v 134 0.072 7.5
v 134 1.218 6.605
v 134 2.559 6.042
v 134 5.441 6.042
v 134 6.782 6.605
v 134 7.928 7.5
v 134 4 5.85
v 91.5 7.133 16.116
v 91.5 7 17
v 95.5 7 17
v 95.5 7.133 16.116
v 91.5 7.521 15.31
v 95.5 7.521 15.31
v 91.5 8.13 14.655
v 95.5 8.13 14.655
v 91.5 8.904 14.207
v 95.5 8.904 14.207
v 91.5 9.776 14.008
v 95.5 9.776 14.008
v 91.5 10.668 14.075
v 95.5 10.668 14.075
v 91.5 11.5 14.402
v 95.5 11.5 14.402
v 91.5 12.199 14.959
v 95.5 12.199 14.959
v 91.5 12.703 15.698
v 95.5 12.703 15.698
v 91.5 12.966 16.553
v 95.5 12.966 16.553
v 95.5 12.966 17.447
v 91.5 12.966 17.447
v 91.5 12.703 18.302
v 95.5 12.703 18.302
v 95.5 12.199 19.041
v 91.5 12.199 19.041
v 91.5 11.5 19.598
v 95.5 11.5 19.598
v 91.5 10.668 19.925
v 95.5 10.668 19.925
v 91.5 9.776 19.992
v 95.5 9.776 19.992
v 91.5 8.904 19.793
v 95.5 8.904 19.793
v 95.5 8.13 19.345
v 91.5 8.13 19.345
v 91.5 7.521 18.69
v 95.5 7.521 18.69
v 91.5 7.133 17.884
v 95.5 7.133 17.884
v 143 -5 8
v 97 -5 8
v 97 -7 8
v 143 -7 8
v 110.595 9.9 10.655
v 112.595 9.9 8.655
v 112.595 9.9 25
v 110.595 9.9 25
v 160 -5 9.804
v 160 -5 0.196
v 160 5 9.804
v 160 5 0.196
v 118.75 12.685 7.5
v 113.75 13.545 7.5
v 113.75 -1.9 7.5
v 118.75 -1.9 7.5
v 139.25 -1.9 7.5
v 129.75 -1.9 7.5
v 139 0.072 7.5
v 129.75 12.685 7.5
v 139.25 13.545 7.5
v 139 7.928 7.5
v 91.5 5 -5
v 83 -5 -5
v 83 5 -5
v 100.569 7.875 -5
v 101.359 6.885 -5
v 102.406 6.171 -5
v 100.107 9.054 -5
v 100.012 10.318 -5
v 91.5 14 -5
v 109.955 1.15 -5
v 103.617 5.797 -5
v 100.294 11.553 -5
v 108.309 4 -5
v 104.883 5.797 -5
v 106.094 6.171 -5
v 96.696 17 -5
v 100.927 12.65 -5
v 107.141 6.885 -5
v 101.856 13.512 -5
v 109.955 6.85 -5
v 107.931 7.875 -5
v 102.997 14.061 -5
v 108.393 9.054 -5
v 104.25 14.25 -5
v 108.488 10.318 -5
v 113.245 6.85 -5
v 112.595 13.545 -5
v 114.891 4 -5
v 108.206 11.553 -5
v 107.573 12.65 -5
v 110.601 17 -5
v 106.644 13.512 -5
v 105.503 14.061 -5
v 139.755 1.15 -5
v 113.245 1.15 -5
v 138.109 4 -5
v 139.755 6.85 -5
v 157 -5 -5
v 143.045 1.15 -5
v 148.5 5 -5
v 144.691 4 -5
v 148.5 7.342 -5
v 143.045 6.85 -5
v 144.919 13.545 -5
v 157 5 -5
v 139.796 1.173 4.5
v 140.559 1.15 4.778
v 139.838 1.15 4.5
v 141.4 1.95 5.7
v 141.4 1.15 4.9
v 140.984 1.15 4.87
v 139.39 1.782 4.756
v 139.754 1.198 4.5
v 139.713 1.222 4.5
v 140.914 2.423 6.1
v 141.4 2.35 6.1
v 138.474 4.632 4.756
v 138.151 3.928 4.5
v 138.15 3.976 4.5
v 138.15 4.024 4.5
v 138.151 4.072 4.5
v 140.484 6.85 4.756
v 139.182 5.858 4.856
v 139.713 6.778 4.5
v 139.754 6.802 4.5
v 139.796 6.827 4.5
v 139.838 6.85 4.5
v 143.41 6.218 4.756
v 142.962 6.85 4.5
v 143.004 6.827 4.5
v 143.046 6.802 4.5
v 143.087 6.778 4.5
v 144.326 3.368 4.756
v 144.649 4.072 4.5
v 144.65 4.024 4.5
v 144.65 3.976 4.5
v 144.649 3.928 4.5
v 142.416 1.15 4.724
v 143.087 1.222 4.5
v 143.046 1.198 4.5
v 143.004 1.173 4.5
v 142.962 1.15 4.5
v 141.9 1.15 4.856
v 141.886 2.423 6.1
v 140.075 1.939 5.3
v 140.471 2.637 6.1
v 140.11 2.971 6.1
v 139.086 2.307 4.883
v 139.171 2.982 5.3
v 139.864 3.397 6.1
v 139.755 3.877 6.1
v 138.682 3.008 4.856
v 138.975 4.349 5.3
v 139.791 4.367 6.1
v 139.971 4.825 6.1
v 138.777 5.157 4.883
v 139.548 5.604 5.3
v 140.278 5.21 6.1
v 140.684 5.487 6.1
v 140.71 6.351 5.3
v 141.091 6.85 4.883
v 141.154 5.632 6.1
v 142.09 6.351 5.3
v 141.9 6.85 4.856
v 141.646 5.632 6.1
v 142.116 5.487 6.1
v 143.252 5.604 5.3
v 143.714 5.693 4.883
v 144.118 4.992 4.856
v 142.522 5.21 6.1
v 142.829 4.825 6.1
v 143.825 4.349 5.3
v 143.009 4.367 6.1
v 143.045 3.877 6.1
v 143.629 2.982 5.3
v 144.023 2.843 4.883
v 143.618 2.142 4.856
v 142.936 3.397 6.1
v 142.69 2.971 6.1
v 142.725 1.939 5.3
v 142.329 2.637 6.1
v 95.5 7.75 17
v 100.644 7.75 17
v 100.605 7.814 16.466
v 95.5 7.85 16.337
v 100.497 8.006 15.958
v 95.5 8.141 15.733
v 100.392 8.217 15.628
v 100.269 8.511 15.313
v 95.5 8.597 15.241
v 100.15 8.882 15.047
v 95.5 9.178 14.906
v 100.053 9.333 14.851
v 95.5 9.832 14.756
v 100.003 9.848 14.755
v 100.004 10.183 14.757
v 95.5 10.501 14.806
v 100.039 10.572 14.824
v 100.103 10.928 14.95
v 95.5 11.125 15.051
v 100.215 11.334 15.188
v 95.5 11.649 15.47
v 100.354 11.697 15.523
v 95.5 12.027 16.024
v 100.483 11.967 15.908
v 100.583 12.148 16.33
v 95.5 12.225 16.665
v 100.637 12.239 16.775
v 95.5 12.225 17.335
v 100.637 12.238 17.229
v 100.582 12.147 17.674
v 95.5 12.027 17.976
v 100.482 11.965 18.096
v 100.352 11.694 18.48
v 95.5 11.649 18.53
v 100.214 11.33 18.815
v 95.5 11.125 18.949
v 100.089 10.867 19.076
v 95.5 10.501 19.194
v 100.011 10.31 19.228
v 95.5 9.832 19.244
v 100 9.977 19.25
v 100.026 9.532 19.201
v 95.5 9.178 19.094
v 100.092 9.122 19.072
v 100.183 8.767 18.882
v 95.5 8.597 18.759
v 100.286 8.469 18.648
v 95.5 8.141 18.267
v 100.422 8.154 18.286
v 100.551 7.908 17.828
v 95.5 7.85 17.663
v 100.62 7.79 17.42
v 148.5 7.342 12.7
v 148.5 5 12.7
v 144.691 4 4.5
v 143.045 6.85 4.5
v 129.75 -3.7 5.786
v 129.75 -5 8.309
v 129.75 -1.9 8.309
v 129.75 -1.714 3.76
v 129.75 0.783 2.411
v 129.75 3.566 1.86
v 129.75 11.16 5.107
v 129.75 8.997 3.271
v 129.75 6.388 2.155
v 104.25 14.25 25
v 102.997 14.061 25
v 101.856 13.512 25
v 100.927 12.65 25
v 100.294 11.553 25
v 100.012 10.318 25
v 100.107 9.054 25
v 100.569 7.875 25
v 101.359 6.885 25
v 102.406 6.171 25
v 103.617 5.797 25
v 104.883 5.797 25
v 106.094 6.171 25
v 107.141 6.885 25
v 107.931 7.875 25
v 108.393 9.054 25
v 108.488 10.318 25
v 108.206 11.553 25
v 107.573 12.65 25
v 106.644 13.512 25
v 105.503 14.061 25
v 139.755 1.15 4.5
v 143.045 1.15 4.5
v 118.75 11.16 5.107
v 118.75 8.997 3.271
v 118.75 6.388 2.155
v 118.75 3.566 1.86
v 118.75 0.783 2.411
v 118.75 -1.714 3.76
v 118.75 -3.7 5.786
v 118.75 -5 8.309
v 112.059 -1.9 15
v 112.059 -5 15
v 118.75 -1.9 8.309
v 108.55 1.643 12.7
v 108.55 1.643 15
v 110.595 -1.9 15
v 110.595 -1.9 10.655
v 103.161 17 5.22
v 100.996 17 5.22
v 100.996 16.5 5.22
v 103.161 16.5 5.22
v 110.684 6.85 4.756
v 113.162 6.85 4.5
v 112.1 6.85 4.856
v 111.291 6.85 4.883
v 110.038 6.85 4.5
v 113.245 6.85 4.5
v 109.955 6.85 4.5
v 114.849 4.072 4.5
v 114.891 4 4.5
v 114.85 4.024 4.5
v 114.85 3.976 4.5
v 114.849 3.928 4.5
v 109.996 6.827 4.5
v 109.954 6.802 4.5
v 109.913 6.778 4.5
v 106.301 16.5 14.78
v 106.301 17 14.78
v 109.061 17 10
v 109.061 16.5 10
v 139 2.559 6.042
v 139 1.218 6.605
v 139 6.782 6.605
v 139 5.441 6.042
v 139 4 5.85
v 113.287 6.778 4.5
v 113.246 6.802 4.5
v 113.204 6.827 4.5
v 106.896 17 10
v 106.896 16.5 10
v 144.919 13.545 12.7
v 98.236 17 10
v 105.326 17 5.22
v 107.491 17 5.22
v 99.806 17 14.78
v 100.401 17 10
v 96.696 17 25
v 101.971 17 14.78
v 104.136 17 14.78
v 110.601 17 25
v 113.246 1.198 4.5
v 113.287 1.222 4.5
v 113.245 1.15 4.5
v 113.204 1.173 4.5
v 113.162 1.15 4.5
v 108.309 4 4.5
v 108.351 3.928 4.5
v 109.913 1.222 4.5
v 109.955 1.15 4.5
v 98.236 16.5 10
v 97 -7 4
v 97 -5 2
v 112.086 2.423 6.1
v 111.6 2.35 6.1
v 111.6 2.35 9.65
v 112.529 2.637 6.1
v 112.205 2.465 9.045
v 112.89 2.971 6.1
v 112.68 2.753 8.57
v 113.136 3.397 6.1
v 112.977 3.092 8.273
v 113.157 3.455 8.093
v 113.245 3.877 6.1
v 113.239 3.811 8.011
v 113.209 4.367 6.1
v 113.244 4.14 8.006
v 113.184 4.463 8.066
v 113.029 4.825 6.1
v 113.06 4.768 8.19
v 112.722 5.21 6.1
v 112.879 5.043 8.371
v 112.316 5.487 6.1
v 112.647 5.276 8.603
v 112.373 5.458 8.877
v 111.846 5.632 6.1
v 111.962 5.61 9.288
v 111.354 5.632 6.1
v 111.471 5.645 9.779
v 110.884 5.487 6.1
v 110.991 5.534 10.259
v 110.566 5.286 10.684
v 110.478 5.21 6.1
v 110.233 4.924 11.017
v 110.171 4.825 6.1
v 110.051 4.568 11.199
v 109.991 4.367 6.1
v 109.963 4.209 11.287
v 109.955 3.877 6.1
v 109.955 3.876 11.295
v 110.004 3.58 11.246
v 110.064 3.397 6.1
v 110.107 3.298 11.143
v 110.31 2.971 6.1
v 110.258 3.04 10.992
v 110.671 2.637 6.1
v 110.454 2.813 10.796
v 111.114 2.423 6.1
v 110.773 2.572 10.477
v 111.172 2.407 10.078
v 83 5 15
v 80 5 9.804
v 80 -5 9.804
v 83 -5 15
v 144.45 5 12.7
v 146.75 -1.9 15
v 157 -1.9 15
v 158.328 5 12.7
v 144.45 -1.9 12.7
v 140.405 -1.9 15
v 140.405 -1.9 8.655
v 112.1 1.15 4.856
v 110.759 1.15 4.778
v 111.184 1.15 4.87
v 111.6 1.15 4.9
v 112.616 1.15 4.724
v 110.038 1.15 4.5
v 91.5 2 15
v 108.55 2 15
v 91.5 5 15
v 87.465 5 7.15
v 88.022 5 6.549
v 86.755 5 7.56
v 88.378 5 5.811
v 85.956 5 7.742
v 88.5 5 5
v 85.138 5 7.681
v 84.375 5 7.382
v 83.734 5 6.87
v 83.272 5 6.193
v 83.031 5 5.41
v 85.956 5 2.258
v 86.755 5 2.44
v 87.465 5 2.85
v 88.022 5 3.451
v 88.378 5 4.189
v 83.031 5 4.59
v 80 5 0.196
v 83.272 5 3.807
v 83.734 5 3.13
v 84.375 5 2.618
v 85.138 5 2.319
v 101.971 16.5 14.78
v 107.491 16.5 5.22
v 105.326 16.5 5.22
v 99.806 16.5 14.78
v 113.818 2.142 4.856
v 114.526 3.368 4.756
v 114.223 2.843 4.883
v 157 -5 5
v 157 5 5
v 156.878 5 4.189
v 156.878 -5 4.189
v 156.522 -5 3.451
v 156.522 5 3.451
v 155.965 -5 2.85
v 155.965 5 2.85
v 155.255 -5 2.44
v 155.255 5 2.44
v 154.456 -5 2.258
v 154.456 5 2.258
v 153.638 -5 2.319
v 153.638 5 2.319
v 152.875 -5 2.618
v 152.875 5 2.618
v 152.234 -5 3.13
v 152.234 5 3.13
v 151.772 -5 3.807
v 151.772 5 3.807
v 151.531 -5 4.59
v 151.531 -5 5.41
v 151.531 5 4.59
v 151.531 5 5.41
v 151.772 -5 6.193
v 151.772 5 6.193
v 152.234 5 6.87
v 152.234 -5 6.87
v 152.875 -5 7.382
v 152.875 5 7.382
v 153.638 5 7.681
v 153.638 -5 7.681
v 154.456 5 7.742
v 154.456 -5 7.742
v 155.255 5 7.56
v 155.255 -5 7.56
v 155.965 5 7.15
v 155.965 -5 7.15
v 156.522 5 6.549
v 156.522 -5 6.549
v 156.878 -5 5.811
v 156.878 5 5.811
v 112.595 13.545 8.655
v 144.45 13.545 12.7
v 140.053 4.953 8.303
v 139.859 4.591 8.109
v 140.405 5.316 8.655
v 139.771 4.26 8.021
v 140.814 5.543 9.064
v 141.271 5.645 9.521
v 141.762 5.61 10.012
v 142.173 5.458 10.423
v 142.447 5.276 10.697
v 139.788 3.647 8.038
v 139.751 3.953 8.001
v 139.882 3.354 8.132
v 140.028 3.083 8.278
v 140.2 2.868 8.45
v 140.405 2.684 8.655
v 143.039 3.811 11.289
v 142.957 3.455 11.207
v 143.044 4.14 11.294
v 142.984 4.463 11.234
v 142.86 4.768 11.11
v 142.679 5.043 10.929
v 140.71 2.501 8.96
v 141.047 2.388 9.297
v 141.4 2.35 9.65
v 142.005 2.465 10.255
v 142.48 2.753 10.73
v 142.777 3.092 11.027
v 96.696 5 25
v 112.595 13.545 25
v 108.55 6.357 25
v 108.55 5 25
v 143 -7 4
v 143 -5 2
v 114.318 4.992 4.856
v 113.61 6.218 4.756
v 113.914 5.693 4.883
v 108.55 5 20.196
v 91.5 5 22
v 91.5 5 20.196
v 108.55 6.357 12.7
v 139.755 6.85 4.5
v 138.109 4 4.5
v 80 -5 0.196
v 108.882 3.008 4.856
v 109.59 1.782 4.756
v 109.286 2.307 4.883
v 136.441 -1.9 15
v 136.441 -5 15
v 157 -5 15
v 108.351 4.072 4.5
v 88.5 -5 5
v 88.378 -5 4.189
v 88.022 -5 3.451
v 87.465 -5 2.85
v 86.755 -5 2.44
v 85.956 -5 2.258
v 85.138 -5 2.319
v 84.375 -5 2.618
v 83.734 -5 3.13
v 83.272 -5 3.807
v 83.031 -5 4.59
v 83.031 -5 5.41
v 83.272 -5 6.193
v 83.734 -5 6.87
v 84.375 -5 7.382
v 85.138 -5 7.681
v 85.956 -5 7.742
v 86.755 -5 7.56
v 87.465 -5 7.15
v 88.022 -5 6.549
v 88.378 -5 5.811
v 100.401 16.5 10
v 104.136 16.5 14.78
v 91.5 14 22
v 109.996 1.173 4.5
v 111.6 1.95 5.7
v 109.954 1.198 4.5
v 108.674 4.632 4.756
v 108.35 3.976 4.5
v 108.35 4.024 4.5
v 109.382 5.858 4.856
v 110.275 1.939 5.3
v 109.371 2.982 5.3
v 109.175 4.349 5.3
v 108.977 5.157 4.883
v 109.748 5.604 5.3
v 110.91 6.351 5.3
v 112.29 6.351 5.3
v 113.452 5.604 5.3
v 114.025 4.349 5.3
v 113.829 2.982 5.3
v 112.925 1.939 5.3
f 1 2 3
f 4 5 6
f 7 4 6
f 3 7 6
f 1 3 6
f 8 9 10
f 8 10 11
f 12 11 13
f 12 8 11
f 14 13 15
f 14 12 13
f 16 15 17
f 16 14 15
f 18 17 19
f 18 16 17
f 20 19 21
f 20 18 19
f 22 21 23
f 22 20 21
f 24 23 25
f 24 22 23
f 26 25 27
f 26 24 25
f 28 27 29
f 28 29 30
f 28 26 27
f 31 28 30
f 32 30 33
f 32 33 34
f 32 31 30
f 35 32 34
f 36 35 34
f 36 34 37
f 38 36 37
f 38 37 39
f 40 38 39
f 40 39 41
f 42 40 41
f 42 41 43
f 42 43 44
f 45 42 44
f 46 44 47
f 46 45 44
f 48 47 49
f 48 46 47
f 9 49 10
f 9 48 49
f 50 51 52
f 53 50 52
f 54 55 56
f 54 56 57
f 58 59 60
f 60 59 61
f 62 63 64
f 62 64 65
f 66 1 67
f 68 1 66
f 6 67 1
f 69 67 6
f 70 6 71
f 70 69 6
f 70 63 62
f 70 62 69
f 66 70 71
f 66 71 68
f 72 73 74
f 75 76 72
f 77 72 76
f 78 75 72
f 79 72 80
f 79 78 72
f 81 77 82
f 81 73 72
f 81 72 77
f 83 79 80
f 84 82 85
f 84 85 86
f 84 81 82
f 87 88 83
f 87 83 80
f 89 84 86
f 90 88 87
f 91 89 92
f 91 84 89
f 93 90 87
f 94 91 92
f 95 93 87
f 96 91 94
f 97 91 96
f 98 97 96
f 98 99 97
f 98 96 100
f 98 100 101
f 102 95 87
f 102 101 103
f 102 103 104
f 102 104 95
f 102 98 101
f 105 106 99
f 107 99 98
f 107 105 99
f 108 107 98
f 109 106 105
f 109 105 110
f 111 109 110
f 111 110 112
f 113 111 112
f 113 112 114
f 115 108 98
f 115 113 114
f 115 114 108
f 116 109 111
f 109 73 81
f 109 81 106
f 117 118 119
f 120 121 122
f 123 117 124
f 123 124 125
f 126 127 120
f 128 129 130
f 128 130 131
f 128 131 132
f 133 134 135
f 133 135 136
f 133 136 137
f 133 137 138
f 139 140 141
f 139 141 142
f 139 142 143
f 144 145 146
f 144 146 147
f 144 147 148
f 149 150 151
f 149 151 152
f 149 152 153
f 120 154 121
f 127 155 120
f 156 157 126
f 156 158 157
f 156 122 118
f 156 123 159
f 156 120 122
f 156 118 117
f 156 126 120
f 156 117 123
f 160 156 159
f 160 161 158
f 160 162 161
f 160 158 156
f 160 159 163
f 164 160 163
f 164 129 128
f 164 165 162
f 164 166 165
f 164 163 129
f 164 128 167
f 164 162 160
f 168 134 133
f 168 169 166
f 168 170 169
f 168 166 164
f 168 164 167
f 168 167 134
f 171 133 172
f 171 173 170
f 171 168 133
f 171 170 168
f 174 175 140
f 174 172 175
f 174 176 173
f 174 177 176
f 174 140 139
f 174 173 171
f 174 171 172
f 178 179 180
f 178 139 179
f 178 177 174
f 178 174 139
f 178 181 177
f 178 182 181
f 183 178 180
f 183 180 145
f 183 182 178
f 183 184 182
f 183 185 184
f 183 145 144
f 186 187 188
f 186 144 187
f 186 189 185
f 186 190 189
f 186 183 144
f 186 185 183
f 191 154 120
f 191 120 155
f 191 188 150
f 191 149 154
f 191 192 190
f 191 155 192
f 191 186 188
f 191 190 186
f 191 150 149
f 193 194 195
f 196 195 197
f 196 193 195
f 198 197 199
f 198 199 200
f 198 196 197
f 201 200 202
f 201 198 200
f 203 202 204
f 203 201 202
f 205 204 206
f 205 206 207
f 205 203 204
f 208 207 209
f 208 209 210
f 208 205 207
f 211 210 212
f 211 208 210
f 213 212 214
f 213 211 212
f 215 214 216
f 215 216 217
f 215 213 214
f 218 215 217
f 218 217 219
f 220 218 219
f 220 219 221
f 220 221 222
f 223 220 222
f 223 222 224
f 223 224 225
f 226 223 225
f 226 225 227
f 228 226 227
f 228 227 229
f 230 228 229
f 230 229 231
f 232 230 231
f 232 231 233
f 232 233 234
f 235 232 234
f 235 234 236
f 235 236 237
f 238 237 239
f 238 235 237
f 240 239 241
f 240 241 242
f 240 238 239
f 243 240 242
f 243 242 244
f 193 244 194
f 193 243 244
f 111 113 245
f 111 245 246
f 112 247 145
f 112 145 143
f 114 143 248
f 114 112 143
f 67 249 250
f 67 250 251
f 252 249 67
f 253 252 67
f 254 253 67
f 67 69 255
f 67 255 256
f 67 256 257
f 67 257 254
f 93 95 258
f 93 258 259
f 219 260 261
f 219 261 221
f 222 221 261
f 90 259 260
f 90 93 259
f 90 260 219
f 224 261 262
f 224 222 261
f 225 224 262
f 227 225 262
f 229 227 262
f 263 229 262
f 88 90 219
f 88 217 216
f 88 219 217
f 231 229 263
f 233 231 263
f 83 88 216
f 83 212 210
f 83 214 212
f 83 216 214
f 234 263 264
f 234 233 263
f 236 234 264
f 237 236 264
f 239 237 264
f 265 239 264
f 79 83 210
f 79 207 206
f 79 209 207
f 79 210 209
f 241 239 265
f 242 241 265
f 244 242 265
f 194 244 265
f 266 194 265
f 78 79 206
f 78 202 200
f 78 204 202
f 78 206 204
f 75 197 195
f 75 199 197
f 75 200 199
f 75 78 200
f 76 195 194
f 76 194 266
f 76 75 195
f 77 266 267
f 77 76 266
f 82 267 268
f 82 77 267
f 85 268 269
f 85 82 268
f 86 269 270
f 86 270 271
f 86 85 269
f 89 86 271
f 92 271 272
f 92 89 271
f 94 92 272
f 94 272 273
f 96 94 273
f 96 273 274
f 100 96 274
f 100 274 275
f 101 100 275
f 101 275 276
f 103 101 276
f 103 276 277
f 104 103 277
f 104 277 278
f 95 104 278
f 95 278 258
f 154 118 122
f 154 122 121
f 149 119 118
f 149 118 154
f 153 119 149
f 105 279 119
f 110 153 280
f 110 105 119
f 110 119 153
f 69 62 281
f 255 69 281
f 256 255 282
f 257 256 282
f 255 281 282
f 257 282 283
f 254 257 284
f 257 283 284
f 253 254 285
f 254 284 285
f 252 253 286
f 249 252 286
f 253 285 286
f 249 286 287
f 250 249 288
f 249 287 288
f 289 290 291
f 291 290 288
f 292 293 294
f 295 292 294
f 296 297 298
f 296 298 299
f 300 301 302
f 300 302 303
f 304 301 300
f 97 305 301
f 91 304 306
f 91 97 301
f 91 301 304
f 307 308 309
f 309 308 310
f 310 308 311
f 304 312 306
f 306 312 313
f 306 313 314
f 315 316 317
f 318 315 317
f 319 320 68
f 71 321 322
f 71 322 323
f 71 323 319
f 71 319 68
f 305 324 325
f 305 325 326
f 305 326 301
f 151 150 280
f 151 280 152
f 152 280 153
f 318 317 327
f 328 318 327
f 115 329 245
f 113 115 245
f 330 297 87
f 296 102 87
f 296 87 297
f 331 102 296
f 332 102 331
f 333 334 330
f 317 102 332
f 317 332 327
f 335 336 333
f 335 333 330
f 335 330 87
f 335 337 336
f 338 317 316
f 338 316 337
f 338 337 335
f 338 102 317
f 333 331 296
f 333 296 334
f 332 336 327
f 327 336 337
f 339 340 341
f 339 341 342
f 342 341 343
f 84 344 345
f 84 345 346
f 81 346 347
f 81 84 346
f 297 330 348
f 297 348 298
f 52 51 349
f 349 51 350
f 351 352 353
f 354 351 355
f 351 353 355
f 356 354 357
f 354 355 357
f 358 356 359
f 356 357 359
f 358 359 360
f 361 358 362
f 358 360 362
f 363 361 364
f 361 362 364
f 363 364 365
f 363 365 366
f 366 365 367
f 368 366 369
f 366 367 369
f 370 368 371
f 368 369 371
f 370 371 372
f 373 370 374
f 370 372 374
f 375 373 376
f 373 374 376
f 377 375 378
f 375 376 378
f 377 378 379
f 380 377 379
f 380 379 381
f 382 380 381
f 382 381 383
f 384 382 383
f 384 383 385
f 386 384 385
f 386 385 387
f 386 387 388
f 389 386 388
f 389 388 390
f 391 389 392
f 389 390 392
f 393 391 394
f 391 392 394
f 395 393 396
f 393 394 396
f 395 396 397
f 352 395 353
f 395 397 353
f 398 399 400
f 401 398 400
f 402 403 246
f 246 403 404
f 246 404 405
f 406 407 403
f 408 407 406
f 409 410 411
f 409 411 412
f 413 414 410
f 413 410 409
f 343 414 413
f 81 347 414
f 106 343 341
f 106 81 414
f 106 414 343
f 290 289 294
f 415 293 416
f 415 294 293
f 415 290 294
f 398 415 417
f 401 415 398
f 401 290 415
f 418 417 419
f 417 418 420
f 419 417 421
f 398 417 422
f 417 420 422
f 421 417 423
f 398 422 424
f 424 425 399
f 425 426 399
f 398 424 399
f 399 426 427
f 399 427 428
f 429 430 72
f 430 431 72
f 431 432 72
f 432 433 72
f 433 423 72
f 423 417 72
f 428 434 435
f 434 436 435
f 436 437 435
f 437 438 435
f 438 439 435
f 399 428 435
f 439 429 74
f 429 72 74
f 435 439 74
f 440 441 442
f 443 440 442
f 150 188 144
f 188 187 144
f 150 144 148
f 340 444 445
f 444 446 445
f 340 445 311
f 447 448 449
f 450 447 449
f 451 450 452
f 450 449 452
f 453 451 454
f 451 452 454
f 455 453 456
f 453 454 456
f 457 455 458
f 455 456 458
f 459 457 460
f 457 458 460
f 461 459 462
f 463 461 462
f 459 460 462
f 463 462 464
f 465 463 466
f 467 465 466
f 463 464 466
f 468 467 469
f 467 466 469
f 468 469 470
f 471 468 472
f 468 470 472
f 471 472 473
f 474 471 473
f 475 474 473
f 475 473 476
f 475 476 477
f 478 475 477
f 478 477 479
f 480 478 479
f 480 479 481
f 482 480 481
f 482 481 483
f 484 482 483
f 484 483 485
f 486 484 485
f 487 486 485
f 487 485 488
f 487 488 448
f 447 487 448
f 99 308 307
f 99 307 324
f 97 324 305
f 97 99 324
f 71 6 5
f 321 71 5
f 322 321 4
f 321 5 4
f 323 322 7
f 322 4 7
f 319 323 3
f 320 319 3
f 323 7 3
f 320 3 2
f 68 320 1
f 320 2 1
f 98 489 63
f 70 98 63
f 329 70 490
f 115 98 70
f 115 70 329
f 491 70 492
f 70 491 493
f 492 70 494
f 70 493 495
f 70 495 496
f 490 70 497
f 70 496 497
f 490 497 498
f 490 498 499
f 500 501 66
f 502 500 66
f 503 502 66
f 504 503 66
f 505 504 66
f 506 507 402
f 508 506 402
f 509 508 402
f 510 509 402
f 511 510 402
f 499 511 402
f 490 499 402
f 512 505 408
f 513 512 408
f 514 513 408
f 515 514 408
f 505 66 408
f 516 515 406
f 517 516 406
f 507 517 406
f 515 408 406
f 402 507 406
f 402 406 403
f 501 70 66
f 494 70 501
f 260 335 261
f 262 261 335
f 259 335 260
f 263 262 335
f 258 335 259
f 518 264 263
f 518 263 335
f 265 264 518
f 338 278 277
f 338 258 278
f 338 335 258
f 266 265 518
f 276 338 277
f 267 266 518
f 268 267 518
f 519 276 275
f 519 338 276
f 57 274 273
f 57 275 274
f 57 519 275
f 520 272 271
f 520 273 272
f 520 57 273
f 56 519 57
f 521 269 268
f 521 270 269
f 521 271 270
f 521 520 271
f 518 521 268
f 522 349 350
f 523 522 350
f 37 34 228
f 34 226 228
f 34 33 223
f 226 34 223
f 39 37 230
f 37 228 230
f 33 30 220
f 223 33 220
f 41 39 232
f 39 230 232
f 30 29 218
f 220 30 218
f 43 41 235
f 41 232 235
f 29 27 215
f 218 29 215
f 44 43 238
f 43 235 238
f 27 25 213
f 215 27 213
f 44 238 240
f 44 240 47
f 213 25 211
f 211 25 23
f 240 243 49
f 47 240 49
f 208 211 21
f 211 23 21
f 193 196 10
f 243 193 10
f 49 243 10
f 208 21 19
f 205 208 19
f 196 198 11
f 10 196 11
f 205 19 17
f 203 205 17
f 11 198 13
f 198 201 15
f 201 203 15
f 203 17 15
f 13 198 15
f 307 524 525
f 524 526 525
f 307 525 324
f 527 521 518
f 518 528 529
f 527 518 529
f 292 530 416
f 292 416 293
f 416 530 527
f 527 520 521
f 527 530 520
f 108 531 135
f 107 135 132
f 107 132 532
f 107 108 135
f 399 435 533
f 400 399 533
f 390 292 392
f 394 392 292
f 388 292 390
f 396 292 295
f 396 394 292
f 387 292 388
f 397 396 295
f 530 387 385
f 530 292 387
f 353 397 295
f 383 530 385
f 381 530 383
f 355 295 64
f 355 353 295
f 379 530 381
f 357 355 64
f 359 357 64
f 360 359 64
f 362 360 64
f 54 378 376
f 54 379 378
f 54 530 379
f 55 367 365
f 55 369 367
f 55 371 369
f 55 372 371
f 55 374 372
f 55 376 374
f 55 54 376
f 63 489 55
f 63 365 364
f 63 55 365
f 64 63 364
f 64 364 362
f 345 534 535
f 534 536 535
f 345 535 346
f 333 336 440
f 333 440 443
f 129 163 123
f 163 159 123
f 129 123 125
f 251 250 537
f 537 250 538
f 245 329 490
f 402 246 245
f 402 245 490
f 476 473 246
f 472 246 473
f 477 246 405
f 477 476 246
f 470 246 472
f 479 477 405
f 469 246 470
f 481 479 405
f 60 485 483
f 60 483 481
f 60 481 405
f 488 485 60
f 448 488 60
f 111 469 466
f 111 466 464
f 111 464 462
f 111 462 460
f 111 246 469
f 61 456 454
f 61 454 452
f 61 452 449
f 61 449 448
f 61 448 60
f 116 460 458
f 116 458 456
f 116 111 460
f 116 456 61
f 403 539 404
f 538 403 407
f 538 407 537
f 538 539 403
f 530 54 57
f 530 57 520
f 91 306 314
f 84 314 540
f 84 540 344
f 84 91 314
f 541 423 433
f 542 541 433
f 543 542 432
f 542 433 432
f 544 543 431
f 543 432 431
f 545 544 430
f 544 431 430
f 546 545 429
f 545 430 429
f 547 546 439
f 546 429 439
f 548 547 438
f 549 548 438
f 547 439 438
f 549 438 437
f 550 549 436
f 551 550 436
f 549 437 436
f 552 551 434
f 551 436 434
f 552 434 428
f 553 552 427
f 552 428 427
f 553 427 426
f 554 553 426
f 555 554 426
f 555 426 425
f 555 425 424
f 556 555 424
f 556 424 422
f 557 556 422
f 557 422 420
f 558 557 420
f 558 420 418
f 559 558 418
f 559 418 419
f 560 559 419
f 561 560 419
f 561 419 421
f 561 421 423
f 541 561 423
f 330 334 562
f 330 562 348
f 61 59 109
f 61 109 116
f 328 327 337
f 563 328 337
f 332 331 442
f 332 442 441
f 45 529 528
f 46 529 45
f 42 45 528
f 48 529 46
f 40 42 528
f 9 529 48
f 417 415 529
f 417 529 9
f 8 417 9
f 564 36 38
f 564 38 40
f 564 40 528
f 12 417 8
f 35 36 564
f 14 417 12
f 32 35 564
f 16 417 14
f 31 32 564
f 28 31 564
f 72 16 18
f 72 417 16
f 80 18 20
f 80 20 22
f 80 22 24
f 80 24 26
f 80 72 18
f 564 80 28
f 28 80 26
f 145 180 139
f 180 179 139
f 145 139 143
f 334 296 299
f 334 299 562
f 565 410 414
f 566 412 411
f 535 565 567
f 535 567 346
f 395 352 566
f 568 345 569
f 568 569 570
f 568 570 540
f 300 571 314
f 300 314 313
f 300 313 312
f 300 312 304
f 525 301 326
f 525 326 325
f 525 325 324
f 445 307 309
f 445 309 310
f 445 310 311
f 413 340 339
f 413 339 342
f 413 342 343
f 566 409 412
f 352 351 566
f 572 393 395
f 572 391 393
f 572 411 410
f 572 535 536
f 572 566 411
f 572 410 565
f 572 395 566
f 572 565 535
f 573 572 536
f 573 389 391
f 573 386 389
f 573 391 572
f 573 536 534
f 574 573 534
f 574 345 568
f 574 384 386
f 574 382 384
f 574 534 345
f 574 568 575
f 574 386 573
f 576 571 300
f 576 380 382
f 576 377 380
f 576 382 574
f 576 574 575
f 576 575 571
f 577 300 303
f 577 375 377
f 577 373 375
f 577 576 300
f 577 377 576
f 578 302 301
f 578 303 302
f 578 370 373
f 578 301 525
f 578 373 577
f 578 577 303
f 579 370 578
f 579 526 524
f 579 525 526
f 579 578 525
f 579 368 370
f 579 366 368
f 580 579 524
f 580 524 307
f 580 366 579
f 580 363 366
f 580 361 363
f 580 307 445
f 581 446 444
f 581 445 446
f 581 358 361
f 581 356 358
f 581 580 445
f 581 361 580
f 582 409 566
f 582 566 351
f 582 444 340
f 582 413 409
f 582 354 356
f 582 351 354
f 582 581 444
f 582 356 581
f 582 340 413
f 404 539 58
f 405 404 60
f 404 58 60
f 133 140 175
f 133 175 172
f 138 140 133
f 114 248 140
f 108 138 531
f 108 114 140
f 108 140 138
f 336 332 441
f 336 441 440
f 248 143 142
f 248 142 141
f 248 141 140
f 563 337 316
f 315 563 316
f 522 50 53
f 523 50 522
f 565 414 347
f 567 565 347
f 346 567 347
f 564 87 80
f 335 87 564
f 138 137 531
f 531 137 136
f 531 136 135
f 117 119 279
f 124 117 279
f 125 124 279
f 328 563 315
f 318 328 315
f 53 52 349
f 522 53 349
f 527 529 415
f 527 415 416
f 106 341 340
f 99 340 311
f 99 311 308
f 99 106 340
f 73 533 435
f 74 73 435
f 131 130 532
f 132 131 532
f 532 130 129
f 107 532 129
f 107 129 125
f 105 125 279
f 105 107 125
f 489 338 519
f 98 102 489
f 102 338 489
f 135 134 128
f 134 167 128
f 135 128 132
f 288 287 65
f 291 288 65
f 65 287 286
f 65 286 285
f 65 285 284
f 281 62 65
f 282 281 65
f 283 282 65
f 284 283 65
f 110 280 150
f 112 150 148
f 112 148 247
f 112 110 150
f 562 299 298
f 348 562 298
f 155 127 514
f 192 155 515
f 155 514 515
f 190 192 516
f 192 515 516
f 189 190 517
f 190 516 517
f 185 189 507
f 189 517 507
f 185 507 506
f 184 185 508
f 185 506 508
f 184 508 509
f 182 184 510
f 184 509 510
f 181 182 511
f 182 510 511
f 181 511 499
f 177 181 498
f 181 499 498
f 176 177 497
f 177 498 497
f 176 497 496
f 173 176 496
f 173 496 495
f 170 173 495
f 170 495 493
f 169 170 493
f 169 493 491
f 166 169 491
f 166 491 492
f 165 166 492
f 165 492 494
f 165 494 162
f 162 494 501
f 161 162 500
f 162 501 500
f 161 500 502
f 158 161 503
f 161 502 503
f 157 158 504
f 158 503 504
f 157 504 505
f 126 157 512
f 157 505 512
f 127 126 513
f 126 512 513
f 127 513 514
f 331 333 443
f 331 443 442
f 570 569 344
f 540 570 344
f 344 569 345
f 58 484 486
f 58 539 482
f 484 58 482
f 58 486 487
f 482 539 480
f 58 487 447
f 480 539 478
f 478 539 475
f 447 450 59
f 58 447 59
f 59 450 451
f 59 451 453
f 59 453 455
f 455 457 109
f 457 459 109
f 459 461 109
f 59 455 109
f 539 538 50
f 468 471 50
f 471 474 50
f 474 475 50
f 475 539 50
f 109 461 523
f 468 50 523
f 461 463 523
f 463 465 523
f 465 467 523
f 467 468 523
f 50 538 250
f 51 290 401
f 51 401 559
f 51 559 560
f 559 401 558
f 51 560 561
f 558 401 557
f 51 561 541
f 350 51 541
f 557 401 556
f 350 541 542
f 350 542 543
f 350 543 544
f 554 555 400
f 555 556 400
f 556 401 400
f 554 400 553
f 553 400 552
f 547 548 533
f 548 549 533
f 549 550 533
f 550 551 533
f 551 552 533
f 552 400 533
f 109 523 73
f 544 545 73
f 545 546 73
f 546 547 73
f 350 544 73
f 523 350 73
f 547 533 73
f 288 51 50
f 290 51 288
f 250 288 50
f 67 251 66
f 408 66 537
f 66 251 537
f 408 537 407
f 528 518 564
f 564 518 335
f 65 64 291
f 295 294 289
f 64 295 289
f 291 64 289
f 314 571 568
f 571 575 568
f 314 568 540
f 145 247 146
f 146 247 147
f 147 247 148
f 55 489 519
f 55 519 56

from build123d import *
from OCP.BRepFilletAPI import BRepFilletAPI_MakeChamfer

# Parameters (mm, degrees)
AUFSATZ_LINEAR_AUSTRAGEN1_DEPTH       = 80
SKIZZE2_R                             = 4.25
SCHNITT_LINEAR_AUSTRAGEN1_DEPTH       = 30
SKIZZE3_R                             = 1.65
SCHNITT_LINEAR_AUSTRAGEN2_DEPTH       = 17.5
SKIZZE4_R                             = 1.65
SCHNITT_LINEAR_AUSTRAGEN3_DEPTH       = 30
SCHNITT_LINEAR_START                  = -22
SKIZZE5_R                             = 2.75
SCHNITT_LINEAR_AUSTRAGEN4_DEPTH       = 22
SKIZZE6_R                             = 2.75
SCHNITT_LINEAR_AUSTRAGEN5_DEPTH       = 10
SCHNITT_LINEAR_AUSTRAGEN6_DEPTH       = 9.5
SCHNITT_LINEAR_START_2                = -12.5
SKIZZE8_W                             = 11.5
SKIZZE8_H                             = 12
SCHNITT_LINEAR_AUSTRAGEN7_DEPTH       = 30
SCHNITT_LINEAR_START_3                = 10.2
SKIZZE9_R                             = 9.5
SCHNITT_LINEAR_AUSTRAGEN8_DEPTH       = 11
SCHNITT_LINEAR_START_4                = 25.45
SKIZZE10_R                            = 5.5
SCHNITT_LINEAR_AUSTRAGEN9_DEPTH       = 5
AUFSATZ_LINEAR_START                  = -18.545259589
AUFSATZ_LINEAR_AUSTRAGEN2_DEPTH       = 15.445259589
SCHNITT_LINEAR_START_5                = -20.5
SKIZZE12_R                            = 1.65
SCHNITT_LINEAR_AUSTRAGEN10_DEPTH      = 20.5
FASE1_SIZE                            = 1.6
SKIZZE15_W                            = 20
SKIZZE15_H                            = 10
SCHNITT_LINEAR_AUSTRAGEN12_DEPTH      = 80
SCHNITT_LINEAR_START_6                = -15.44526
SCHNITT_LINEAR_AUSTRAGEN13_DEPTH      = 15.44526
SCHNITT_LINEAR_START_7                = -3.1
SKIZZE17_W                            = 49.404551733
SKIZZE17_H                            = 10
SCHNITT_LINEAR_AUSTRAGEN14_DEPTH      = 3.1
SCHNITT_LINEAR_AUSTRAGEN17_DEPTH      = 11
AUFSATZ_LINEAR_AUSTRAGEN3_REACH       = 87.346
SKIZZE21_W                            = 10
SKIZZE21_H                            = 10
SCHNITT_LINEAR_AUSTRAGEN18_DEPTH      = 30.595448267
SCHNITT_LINEAR_AUSTRAGEN19_REACH      = 76.674
SCHNITT_LINEAR_AUSTRAGEN19_END_RADIUS = 4.25
SKIZZE22_R                            = 2.25
SKIZZE23_R                            = 3
SCHNITT_LINEAR_AUSTRAGEN20_DEPTH      = 4
FASE2_SIZE                            = 3
FASE2_SIZE2                           = 5.196152423
AUFSATZ_LINEAR_START_2                = -17
AUFSATZ_LINEAR_AUSTRAGEN4_DEPTH       = 46
FASE3_SIZE                            = 3
FASE3_SIZE2                           = 5.196152423
FASE4_SIZE                            = 3
FASE4_SIZE2                           = 5.196152423
SCHNITT_LINEAR_AUSTRAGEN23_DEPTH      = 3.1
SCHNITT_LINEAR_AUSTRAGEN22_DEPTH      = 0.5
K_RPER_VERSCHIEBEN_KOPIEREN1_ANGLE    = 90


# Read off the part's stored shape, not the designer's step: Aufsatz-Linear austragen2, Schnitt-Linear austragen17
with BuildPart() as part:
    # Skizze1 → Aufsatz-Linear austragen1 (new body)
    with BuildSketch(Plane(origin=(0, 0, 0), x_dir=(0, 0, -1), z_dir=(1, 0, 0))):
        Polygon((0, 0), (0, 20), (-22, 20), (-22, -10), (20, -10), (20, 0), align=None)
    extrude(amount=AUFSATZ_LINEAR_AUSTRAGEN1_DEPTH)

    # Skizze2 → Schnitt-Linear austragen1 (cut)
    with BuildSketch(Plane(origin=(0, 20, 0), x_dir=(1, 0, 0), z_dir=(0, 1, 0))):
        with Locations(Location((55.75, -15, 0), (0, 0, 270))):
            Circle(SKIZZE2_R)
    extrude(amount=-SCHNITT_LINEAR_AUSTRAGEN1_DEPTH, mode=Mode.SUBTRACT)

    # Skizze3 → Schnitt-Linear austragen2 (cut)
    with BuildSketch(Plane.XZ.offset(10)):
        Polygon((49.399147039, 22), (47.404551733, 18.545259589), (47.404551733, 14.9), (49.404551733, 14.9), (51.45, 11.357179677), (51.45, 6.642820323), (49.404551733, 3.1), (17.595448267, 3.1), (15.55, 6.642820323), (15.55, 11.357179677), (17.595448267, 14.9), (19.595448267, 14.9), (19.595448267, 18.545259589), (0, 18.545259589), (0, 22), align=None)
        with Locations(Location((48.4, 9, 0), (0, 0, 270))):
            Circle(SKIZZE3_R, mode=Mode.SUBTRACT)
        with Locations(Location((18.6, 9, 0), (0, 0, 270))):
            Circle(SKIZZE3_R, mode=Mode.SUBTRACT)
    extrude(amount=-SCHNITT_LINEAR_AUSTRAGEN2_DEPTH, mode=Mode.SUBTRACT)

    # Skizze4 → Schnitt-Linear austragen3 (cut)
    with BuildSketch(Plane.XZ.offset(10)):
        with Locations(Location((18.6, 9, 0), (0, 0, 270))):
            Circle(SKIZZE4_R)
        with Locations(Location((48.4, 9, 0), (0, 0, 270))):
            Circle(SKIZZE4_R)
    extrude(amount=-SCHNITT_LINEAR_AUSTRAGEN3_DEPTH, mode=Mode.SUBTRACT)

    # Skizze5 → Schnitt-Linear austragen4 (cut)
    with BuildSketch(Plane(origin=(0, 0, 0), x_dir=(-1, 0, 0), z_dir=(0, 0, -1)).offset(SCHNITT_LINEAR_START)):
        with Locations((-5.75, 10)):
            Circle(SKIZZE5_R)
        with Locations((-74.25, 10)):
            Circle(SKIZZE5_R)
    extrude(amount=SCHNITT_LINEAR_AUSTRAGEN4_DEPTH, mode=Mode.SUBTRACT)

    # Skizze6 → Schnitt-Linear austragen5 (cut)
    with BuildSketch(Plane(origin=(0, 0, 0), x_dir=(1, 0, 0), z_dir=(0, 1, 0))):
        with Locations(Location((40, 10, 0), (0, 0, 270))):
            Circle(SKIZZE6_R)
    extrude(amount=-SCHNITT_LINEAR_AUSTRAGEN5_DEPTH, mode=Mode.SUBTRACT)

    # Skizze7 → Schnitt-Linear austragen6 (cut)
    with BuildSketch(Plane(origin=(0, 20, 0), x_dir=(1, 0, 0), z_dir=(0, 1, 0))):
        Polygon((21.890896534, -9), (20.245448267, -6.15), (16.954551733, -6.15), (15.309103466, -9), (16.954551733, -11.85), (20.245448267, -11.85), align=None)
        Polygon((51.690896534, -9), (50.045448267, -6.15), (46.754551733, -6.15), (45.109103466, -9), (46.754551733, -11.85), (50.045448267, -11.85), align=None)
    extrude(amount=-SCHNITT_LINEAR_AUSTRAGEN6_DEPTH, mode=Mode.SUBTRACT)

    # Skizze8 → Schnitt-Linear austragen7 (cut)
    with BuildSketch(Plane.XZ.offset(-7.5).offset(SCHNITT_LINEAR_START_2)):
        Polygon((49.399147039, 22), (47.404551733, 18.545259589), (15.081237719, 18.545259589), (11.5, 12.342373906), (11.5, 10), (0, 10), (0, 22), align=None)
        with Locations((74.25, 16)):
            Rectangle(SKIZZE8_W, SKIZZE8_H)
    extrude(amount=SCHNITT_LINEAR_AUSTRAGEN7_DEPTH, mode=Mode.SUBTRACT)

    # Skizze9 → Schnitt-Linear austragen8 (cut)
    with BuildSketch(Plane.ZY.offset(-51.45).offset(SCHNITT_LINEAR_START_3)):
        with Locations((9, 3.65)):
            Circle(SKIZZE9_R)
    extrude(amount=SCHNITT_LINEAR_AUSTRAGEN8_DEPTH, mode=Mode.SUBTRACT)

    # Skizze10 → Schnitt-Linear austragen9 (cut)
    with BuildSketch(Plane.ZY.offset(-51.45).offset(SCHNITT_LINEAR_START_4)):
        with Locations((9, 3.65)):
            Circle(SKIZZE10_R)
    extrude(amount=SCHNITT_LINEAR_AUSTRAGEN9_DEPTH, mode=Mode.SUBTRACT)

    # Aufsatz-Linear austragen2 outline → Aufsatz-Linear austragen2 (add)
    with BuildSketch(Plane(origin=(0, 0, 0), x_dir=(-1, 0, 0), z_dir=(0, 0, -1)).offset(AUFSATZ_LINEAR_START)):
        Polygon((-46.25, 7.5), (-51.45, 7.5), (-51.45, 2.3), align=None)
        Polygon((-15.55, 7.5), (-20.75, 7.5), (-15.55, 2.3), align=None)
    extrude(amount=AUFSATZ_LINEAR_AUSTRAGEN2_DEPTH)

    # Skizze12 → Schnitt-Linear austragen10 (cut)
    with BuildSketch(Plane(origin=(0, 10.5, 0), x_dir=(1, 0, 0), z_dir=(0, 1, 0)).offset(SCHNITT_LINEAR_START_5)):
        with Locations(Location((18.6, -9, 0), (0, 0, 90))):
            Circle(SKIZZE12_R)
        with Locations(Location((48.4, -9, 0), (0, 0, 90))):
            Circle(SKIZZE12_R)
    extrude(amount=SCHNITT_LINEAR_AUSTRAGEN10_DEPTH, mode=Mode.SUBTRACT)

    # Fase1
    # the kernel refuses this chamfer: 1.6 mm, written as the material it takes off along each edge
    with BuildSketch(Plane(origin=(18.6, 10.5, 9), x_dir=(0, 0, -1), z_dir=(-1, 0, 0))) as fase1_piece_1_section:
        Polygon((1.65 + FASE1_SIZE, 0), (1.65, FASE1_SIZE), (1.65, 0), align=None)
    fase1_piece_1 = revolve(axis=Axis((18.6, 10.5, 9), (0, -1, 0)), mode=Mode.PRIVATE)
    fase1_piece_1 = split(fase1_piece_1, bisect_by=Plane(origin=(20.016275588, 9.716390068, 12.246938724), z_dir=(-0.8660254037844389, 0, -0.4999999999999995)), keep=Keep.TOP, mode=Mode.PRIVATE)
    fase1_piece_1 = split(fase1_piece_1, bisect_by=Plane(origin=(18.6, 9.716390068, 11.85), z_dir=(0, 0, -1)), keep=Keep.TOP, mode=Mode.PRIVATE)
    fase1_piece_1 = split(fase1_piece_1, bisect_by=Plane(origin=(22.120069214, 9.716390068, 9.396938724), z_dir=(-0.8660254037844397, 0, 0.4999999999999981)), keep=Keep.TOP, mode=Mode.PRIVATE)
    fase1_piece_1 = split(fase1_piece_1, bisect_by=Plane(origin=(17.183724412, 9.716390068, 12.246938724), z_dir=(0.8660254037844387, 0, -0.4999999999999999)), keep=Keep.TOP, mode=Mode.PRIVATE)
    fase1_piece_1 = split(fase1_piece_1, bisect_by=Plane(origin=(18.6, 9.716390068, 6.15), z_dir=(0, 0, 1)), keep=Keep.TOP, mode=Mode.PRIVATE)
    fase1_piece_1 = split(fase1_piece_1, bisect_by=Plane(origin=(15.079930786, 9.716390068, 9.396938724), z_dir=(0.8660254037844385, 0, 0.5000000000000003)), keep=Keep.TOP, mode=Mode.PRIVATE)
    add(fase1_piece_1, mode=Mode.SUBTRACT)
    with BuildSketch(Plane(origin=(48.4, 10.5, 9), x_dir=(0, 0, -1), z_dir=(-1, 0, 0))) as fase1_piece_2_section:
        Polygon((1.65 + FASE1_SIZE, 0), (1.65, FASE1_SIZE), (1.65, 0), align=None)
    fase1_piece_2 = revolve(axis=Axis((48.4, 10.5, 9), (0, -1, 0)), mode=Mode.PRIVATE)
    fase1_piece_2 = split(fase1_piece_2, bisect_by=Plane(origin=(49.816275588, 9.716390068, 12.246938724), z_dir=(-0.8660254037844392, 0, -0.4999999999999991)), keep=Keep.TOP, mode=Mode.PRIVATE)
    fase1_piece_2 = split(fase1_piece_2, bisect_by=Plane(origin=(48.4, 9.716390068, 11.85), z_dir=(0, 0, -1)), keep=Keep.TOP, mode=Mode.PRIVATE)
    fase1_piece_2 = split(fase1_piece_2, bisect_by=Plane(origin=(51.920069214, 9.716390068, 9.396938724), z_dir=(-0.8660254037844392, 0, 0.49999999999999917)), keep=Keep.TOP, mode=Mode.PRIVATE)
    fase1_piece_2 = split(fase1_piece_2, bisect_by=Plane(origin=(46.983724412, 9.716390068, 12.246938724), z_dir=(0.8660254037844384, 0, -0.5000000000000006)), keep=Keep.TOP, mode=Mode.PRIVATE)
    fase1_piece_2 = split(fase1_piece_2, bisect_by=Plane(origin=(48.4, 9.716390068, 6.15), z_dir=(0, 0, 1)), keep=Keep.TOP, mode=Mode.PRIVATE)
    fase1_piece_2 = split(fase1_piece_2, bisect_by=Plane(origin=(44.879930786, 9.716390068, 9.396938724), z_dir=(0.8660254037844386, 0, 0.5000000000000001)), keep=Keep.TOP, mode=Mode.PRIVATE)
    add(fase1_piece_2, mode=Mode.SUBTRACT)

    # Skizze15 → Schnitt-Linear austragen12 (cut)
    with BuildSketch(Plane(origin=(80, 0, 0), x_dir=(0, 0, -1), z_dir=(1, 0, 0))):
        with Locations((10, -5)):
            Rectangle(SKIZZE15_W, SKIZZE15_H)
    extrude(amount=-SCHNITT_LINEAR_AUSTRAGEN12_DEPTH, mode=Mode.SUBTRACT)

    # Skizze16 → Schnitt-Linear austragen13 (cut)
    with BuildSketch(Plane.XY.offset(18.545259589).offset(SCHNITT_LINEAR_START_6)):
        Polygon((0, -10), (0, 2.3), (15.55, 2.3), (19.595448267, 6.345448267), (19.595448267, -10), align=None)
    extrude(amount=SCHNITT_LINEAR_AUSTRAGEN13_DEPTH, mode=Mode.SUBTRACT)

    # Skizze17 → Schnitt-Linear austragen14 (cut)
    with BuildSketch(Plane.XY.offset(3.1).offset(SCHNITT_LINEAR_START_7)):
        with Locations((24.702275867, -5)):
            Rectangle(SKIZZE17_W, SKIZZE17_H)
    extrude(amount=SCHNITT_LINEAR_AUSTRAGEN14_DEPTH, mode=Mode.SUBTRACT)

    # Schnitt-Linear austragen17 outline → Schnitt-Linear austragen17 (cut)
    with BuildSketch(Plane(origin=(30.25, 0, 0), x_dir=(0, 0, -1), z_dir=(1, 0, 0))):
        with BuildLine():
            ThreePointArc((0, 0.608618735), (-0.109374334, 0.302347799), (-0.229167656, 0))
            Line((-0.229167656, 0), (0, 0))
            Line((0, 0), (0, 0.608618735))
        make_face()
    extrude(amount=SCHNITT_LINEAR_AUSTRAGEN17_DEPTH, mode=Mode.SUBTRACT)

    # Aufsatz-Linear austragen3: up to this plane
    aufsatz_linear_austragen3_end = Plane(origin=(-0.5159461, -13.7659461, 25.899170114), z_dir=(0.707106781186543, -0.707106781186552, 0))
    # Skizze20 → Aufsatz-Linear austragen3 (add, up to the surface)
    with BuildSketch(Plane.ZY, mode=Mode.PRIVATE) as aufsatz_linear_austragen3_sk1:
        Polygon((10, 2.3), (3.1, 2.3), (3.1, 0), align=None)
    aufsatz_linear_austragen3_tool1 = split(extrude(aufsatz_linear_austragen3_sk1.sketch, amount=-AUFSATZ_LINEAR_AUSTRAGEN3_REACH, mode=Mode.PRIVATE), bisect_by=aufsatz_linear_austragen3_end, keep=Keep.BOTH, mode=Mode.PRIVATE)
    add(aufsatz_linear_austragen3_tool1.solids().sort_by_distance((0, 1.533333, 5.4))[0])

    # Skizze21 → Schnitt-Linear austragen18 (cut)
    with BuildSketch(Plane(origin=(80, 0, 0), x_dir=(0, 0, -1), z_dir=(1, 0, 0))):
        with Locations((-5, -5)):
            Rectangle(SKIZZE21_W, SKIZZE21_H)
    extrude(amount=-SCHNITT_LINEAR_AUSTRAGEN18_DEPTH, mode=Mode.SUBTRACT)

    # Schnitt-Linear austragen19: up to this cylinder (the profile starts outside it)
    schnitt_linear_austragen19_end = Plane(origin=(55.75, -2, 15), z_dir=(0, 1, 0)) * Cylinder(SCHNITT_LINEAR_AUSTRAGEN19_END_RADIUS, 162.848, mode=Mode.PRIVATE)
    # Skizze22 → Schnitt-Linear austragen19 (cut, up to the surface)
    with BuildSketch(Plane(origin=(68.5, 0, 0), x_dir=(0, 0, -1), z_dir=(1, 0, 0)), mode=Mode.PRIVATE) as schnitt_linear_austragen19_sk1:
        with Locations((-15, -2)):
            Circle(SKIZZE22_R)
    schnitt_linear_austragen19_tool1 = extrude(schnitt_linear_austragen19_sk1.sketch, amount=-SCHNITT_LINEAR_AUSTRAGEN19_REACH, mode=Mode.PRIVATE) - schnitt_linear_austragen19_end
    add(schnitt_linear_austragen19_tool1.solids().sort_by_distance((68.5, -2, 15))[0], mode=Mode.SUBTRACT)

    # Skizze23 → Schnitt-Linear austragen20 (cut)
    with BuildSketch(Plane(origin=(68.5, 0, 0), x_dir=(0, 0, -1), z_dir=(1, 0, 0))):
        with Locations((-15, -2)):
            Circle(SKIZZE23_R)
    extrude(amount=-SCHNITT_LINEAR_AUSTRAGEN20_DEPTH, mode=Mode.SUBTRACT)

    # Fase2
    fase2_edges = [part.edges().sort_by_distance(p)[0] for p in [
        (68.5, 5, 22),
    ]]
    fase2_side = [part.faces().sort_by_distance(p)[0] for p in [
        (68.5, 5.5966386, 16.085234086),
    ]]
    chamfer(fase2_edges, length=FASE2_SIZE, length2=FASE2_SIZE2, reference=fase2_side[0])

    # Skizze24 → Aufsatz-Linear austragen4 (add)
    with BuildSketch(Plane(origin=(80, 0, 0), x_dir=(0, 0, -1), z_dir=(1, 0, 0)).offset(AUFSATZ_LINEAR_START_2)):
        Polygon((2, 11), (0, 13), (0, 7), (2, 7), align=None)
    extrude(amount=-AUFSATZ_LINEAR_AUSTRAGEN4_DEPTH)

    # Fase3: one chamfer whose edges measure the first distance from different faces: ONE call of the kernel's chamfer builder (chamfer() names one face for all edges)
    fase3_edges_1 = [part.edges().sort_by_distance(p)[0] for p in [
        (80, 20, 5),
        (0, 20, 5),
    ]]
    fase3_side_1 = [part.faces().sort_by_distance(p)[0] for p in [
        (40.691863388, 20, 8.699373831),
    ]]
    fase3_edges_2 = [part.edges().sort_by_distance(p)[0] for p in [
        (68.5, -10, 14.5),
    ]]
    fase3_side_2 = [part.faces().sort_by_distance(p)[0] for p in [
        (68.5, 5.818780812, 14.441515656),
    ]]
    fase3_edges_3 = [part.edges().sort_by_distance(p)[0] for p in [
        (0, 0, 1.549999795),
    ]]
    fase3_side_3 = [part.faces().sort_by_distance(p)[0] for p in [
        (15.125, 0, 1.55),
    ]]
    fase3_edges_4 = [part.edges().sort_by_distance(p)[0] for p in [
        (80, 0, 5),
    ]]
    fase3_side_4 = [part.faces().sort_by_distance(p)[0] for p in [
        (63.645982635, 0, 4.651763949),
    ]]
    fase3 = BRepFilletAPI_MakeChamfer(part.part.solid().wrapped)
    for e in fase3_edges_1:
        fase3.Add(FASE3_SIZE, FASE3_SIZE2, e.wrapped, fase3_side_1[0].wrapped)  # the first distance lies on this face
    for e in fase3_edges_2:
        fase3.Add(FASE3_SIZE, FASE3_SIZE2, e.wrapped, fase3_side_2[0].wrapped)  # the first distance lies on this face
    for e in fase3_edges_3:
        fase3.Add(FASE3_SIZE, FASE3_SIZE2, e.wrapped, fase3_side_3[0].wrapped)  # the first distance lies on this face
    for e in fase3_edges_4:
        fase3.Add(FASE3_SIZE, FASE3_SIZE2, e.wrapped, fase3_side_4[0].wrapped)  # the first distance lies on this face
    add(Compound.cast(fase3.Shape()), mode=Mode.REPLACE)

    # Fase4
    fase4_edges = [part.edges().sort_by_distance(p)[0] for p in [
        (59.975, 0, 10),
    ]]
    fase4_side = [part.faces().sort_by_distance(p)[0] for p in [
        (62.113288749, 0, 4.615831632),
    ]]
    chamfer(fase4_edges, length=FASE4_SIZE, length2=FASE4_SIZE2, reference=fase4_side[0])

    # Skizze28 → Schnitt-Linear austragen23 (cut)
    with BuildSketch(Plane(origin=(0, 0, 0), x_dir=(-1, 0, 0), z_dir=(0, 0, -1))):
        Polygon((-30.25, 6.691381265), (-23.558618735, 0), (-47.941381265, 0), (-41.25, 6.691381265), align=None)
    extrude(amount=-SCHNITT_LINEAR_AUSTRAGEN23_DEPTH, mode=Mode.SUBTRACT)


with BuildPart() as body_2:
    # Spiegeln1: mirrored copy
    add(part.part.mirror(Plane(origin=(80, 0, -20), x_dir=(0, 0, 1), z_dir=(1, 0, 0))))

    # Skizze27 → Schnitt-Linear austragen22 (cut)
    with BuildSketch(Plane.XY.offset(22)):
        Polygon((105.325778558, 9.780127019), (107.490842068, 9.780127019), (101.971226825, 0.219872981), (99.806163316, 0.219872981), align=None)
        Polygon((100.995651539, 9.780127019), (103.160715049, 9.780127019), (100.400907428, 5), (98.235843918, 5), align=None)
        Polygon((106.896097956, 5), (104.136290335, 0.219872981), (106.301353844, 0.219872981), (109.061161466, 5), align=None)
    extrude(amount=-SCHNITT_LINEAR_AUSTRAGEN22_DEPTH, mode=Mode.SUBTRACT)


with BuildPart() as body_2_1:
    # Körper-Verschieben/Kopieren1: moved
    add(body_2.part.rotate(Axis((0, 5, 10), (-1, 0, 0)), K_RPER_VERSCHIEBEN_KOPIEREN1_ANGLE))


solid = body_2_1.part
